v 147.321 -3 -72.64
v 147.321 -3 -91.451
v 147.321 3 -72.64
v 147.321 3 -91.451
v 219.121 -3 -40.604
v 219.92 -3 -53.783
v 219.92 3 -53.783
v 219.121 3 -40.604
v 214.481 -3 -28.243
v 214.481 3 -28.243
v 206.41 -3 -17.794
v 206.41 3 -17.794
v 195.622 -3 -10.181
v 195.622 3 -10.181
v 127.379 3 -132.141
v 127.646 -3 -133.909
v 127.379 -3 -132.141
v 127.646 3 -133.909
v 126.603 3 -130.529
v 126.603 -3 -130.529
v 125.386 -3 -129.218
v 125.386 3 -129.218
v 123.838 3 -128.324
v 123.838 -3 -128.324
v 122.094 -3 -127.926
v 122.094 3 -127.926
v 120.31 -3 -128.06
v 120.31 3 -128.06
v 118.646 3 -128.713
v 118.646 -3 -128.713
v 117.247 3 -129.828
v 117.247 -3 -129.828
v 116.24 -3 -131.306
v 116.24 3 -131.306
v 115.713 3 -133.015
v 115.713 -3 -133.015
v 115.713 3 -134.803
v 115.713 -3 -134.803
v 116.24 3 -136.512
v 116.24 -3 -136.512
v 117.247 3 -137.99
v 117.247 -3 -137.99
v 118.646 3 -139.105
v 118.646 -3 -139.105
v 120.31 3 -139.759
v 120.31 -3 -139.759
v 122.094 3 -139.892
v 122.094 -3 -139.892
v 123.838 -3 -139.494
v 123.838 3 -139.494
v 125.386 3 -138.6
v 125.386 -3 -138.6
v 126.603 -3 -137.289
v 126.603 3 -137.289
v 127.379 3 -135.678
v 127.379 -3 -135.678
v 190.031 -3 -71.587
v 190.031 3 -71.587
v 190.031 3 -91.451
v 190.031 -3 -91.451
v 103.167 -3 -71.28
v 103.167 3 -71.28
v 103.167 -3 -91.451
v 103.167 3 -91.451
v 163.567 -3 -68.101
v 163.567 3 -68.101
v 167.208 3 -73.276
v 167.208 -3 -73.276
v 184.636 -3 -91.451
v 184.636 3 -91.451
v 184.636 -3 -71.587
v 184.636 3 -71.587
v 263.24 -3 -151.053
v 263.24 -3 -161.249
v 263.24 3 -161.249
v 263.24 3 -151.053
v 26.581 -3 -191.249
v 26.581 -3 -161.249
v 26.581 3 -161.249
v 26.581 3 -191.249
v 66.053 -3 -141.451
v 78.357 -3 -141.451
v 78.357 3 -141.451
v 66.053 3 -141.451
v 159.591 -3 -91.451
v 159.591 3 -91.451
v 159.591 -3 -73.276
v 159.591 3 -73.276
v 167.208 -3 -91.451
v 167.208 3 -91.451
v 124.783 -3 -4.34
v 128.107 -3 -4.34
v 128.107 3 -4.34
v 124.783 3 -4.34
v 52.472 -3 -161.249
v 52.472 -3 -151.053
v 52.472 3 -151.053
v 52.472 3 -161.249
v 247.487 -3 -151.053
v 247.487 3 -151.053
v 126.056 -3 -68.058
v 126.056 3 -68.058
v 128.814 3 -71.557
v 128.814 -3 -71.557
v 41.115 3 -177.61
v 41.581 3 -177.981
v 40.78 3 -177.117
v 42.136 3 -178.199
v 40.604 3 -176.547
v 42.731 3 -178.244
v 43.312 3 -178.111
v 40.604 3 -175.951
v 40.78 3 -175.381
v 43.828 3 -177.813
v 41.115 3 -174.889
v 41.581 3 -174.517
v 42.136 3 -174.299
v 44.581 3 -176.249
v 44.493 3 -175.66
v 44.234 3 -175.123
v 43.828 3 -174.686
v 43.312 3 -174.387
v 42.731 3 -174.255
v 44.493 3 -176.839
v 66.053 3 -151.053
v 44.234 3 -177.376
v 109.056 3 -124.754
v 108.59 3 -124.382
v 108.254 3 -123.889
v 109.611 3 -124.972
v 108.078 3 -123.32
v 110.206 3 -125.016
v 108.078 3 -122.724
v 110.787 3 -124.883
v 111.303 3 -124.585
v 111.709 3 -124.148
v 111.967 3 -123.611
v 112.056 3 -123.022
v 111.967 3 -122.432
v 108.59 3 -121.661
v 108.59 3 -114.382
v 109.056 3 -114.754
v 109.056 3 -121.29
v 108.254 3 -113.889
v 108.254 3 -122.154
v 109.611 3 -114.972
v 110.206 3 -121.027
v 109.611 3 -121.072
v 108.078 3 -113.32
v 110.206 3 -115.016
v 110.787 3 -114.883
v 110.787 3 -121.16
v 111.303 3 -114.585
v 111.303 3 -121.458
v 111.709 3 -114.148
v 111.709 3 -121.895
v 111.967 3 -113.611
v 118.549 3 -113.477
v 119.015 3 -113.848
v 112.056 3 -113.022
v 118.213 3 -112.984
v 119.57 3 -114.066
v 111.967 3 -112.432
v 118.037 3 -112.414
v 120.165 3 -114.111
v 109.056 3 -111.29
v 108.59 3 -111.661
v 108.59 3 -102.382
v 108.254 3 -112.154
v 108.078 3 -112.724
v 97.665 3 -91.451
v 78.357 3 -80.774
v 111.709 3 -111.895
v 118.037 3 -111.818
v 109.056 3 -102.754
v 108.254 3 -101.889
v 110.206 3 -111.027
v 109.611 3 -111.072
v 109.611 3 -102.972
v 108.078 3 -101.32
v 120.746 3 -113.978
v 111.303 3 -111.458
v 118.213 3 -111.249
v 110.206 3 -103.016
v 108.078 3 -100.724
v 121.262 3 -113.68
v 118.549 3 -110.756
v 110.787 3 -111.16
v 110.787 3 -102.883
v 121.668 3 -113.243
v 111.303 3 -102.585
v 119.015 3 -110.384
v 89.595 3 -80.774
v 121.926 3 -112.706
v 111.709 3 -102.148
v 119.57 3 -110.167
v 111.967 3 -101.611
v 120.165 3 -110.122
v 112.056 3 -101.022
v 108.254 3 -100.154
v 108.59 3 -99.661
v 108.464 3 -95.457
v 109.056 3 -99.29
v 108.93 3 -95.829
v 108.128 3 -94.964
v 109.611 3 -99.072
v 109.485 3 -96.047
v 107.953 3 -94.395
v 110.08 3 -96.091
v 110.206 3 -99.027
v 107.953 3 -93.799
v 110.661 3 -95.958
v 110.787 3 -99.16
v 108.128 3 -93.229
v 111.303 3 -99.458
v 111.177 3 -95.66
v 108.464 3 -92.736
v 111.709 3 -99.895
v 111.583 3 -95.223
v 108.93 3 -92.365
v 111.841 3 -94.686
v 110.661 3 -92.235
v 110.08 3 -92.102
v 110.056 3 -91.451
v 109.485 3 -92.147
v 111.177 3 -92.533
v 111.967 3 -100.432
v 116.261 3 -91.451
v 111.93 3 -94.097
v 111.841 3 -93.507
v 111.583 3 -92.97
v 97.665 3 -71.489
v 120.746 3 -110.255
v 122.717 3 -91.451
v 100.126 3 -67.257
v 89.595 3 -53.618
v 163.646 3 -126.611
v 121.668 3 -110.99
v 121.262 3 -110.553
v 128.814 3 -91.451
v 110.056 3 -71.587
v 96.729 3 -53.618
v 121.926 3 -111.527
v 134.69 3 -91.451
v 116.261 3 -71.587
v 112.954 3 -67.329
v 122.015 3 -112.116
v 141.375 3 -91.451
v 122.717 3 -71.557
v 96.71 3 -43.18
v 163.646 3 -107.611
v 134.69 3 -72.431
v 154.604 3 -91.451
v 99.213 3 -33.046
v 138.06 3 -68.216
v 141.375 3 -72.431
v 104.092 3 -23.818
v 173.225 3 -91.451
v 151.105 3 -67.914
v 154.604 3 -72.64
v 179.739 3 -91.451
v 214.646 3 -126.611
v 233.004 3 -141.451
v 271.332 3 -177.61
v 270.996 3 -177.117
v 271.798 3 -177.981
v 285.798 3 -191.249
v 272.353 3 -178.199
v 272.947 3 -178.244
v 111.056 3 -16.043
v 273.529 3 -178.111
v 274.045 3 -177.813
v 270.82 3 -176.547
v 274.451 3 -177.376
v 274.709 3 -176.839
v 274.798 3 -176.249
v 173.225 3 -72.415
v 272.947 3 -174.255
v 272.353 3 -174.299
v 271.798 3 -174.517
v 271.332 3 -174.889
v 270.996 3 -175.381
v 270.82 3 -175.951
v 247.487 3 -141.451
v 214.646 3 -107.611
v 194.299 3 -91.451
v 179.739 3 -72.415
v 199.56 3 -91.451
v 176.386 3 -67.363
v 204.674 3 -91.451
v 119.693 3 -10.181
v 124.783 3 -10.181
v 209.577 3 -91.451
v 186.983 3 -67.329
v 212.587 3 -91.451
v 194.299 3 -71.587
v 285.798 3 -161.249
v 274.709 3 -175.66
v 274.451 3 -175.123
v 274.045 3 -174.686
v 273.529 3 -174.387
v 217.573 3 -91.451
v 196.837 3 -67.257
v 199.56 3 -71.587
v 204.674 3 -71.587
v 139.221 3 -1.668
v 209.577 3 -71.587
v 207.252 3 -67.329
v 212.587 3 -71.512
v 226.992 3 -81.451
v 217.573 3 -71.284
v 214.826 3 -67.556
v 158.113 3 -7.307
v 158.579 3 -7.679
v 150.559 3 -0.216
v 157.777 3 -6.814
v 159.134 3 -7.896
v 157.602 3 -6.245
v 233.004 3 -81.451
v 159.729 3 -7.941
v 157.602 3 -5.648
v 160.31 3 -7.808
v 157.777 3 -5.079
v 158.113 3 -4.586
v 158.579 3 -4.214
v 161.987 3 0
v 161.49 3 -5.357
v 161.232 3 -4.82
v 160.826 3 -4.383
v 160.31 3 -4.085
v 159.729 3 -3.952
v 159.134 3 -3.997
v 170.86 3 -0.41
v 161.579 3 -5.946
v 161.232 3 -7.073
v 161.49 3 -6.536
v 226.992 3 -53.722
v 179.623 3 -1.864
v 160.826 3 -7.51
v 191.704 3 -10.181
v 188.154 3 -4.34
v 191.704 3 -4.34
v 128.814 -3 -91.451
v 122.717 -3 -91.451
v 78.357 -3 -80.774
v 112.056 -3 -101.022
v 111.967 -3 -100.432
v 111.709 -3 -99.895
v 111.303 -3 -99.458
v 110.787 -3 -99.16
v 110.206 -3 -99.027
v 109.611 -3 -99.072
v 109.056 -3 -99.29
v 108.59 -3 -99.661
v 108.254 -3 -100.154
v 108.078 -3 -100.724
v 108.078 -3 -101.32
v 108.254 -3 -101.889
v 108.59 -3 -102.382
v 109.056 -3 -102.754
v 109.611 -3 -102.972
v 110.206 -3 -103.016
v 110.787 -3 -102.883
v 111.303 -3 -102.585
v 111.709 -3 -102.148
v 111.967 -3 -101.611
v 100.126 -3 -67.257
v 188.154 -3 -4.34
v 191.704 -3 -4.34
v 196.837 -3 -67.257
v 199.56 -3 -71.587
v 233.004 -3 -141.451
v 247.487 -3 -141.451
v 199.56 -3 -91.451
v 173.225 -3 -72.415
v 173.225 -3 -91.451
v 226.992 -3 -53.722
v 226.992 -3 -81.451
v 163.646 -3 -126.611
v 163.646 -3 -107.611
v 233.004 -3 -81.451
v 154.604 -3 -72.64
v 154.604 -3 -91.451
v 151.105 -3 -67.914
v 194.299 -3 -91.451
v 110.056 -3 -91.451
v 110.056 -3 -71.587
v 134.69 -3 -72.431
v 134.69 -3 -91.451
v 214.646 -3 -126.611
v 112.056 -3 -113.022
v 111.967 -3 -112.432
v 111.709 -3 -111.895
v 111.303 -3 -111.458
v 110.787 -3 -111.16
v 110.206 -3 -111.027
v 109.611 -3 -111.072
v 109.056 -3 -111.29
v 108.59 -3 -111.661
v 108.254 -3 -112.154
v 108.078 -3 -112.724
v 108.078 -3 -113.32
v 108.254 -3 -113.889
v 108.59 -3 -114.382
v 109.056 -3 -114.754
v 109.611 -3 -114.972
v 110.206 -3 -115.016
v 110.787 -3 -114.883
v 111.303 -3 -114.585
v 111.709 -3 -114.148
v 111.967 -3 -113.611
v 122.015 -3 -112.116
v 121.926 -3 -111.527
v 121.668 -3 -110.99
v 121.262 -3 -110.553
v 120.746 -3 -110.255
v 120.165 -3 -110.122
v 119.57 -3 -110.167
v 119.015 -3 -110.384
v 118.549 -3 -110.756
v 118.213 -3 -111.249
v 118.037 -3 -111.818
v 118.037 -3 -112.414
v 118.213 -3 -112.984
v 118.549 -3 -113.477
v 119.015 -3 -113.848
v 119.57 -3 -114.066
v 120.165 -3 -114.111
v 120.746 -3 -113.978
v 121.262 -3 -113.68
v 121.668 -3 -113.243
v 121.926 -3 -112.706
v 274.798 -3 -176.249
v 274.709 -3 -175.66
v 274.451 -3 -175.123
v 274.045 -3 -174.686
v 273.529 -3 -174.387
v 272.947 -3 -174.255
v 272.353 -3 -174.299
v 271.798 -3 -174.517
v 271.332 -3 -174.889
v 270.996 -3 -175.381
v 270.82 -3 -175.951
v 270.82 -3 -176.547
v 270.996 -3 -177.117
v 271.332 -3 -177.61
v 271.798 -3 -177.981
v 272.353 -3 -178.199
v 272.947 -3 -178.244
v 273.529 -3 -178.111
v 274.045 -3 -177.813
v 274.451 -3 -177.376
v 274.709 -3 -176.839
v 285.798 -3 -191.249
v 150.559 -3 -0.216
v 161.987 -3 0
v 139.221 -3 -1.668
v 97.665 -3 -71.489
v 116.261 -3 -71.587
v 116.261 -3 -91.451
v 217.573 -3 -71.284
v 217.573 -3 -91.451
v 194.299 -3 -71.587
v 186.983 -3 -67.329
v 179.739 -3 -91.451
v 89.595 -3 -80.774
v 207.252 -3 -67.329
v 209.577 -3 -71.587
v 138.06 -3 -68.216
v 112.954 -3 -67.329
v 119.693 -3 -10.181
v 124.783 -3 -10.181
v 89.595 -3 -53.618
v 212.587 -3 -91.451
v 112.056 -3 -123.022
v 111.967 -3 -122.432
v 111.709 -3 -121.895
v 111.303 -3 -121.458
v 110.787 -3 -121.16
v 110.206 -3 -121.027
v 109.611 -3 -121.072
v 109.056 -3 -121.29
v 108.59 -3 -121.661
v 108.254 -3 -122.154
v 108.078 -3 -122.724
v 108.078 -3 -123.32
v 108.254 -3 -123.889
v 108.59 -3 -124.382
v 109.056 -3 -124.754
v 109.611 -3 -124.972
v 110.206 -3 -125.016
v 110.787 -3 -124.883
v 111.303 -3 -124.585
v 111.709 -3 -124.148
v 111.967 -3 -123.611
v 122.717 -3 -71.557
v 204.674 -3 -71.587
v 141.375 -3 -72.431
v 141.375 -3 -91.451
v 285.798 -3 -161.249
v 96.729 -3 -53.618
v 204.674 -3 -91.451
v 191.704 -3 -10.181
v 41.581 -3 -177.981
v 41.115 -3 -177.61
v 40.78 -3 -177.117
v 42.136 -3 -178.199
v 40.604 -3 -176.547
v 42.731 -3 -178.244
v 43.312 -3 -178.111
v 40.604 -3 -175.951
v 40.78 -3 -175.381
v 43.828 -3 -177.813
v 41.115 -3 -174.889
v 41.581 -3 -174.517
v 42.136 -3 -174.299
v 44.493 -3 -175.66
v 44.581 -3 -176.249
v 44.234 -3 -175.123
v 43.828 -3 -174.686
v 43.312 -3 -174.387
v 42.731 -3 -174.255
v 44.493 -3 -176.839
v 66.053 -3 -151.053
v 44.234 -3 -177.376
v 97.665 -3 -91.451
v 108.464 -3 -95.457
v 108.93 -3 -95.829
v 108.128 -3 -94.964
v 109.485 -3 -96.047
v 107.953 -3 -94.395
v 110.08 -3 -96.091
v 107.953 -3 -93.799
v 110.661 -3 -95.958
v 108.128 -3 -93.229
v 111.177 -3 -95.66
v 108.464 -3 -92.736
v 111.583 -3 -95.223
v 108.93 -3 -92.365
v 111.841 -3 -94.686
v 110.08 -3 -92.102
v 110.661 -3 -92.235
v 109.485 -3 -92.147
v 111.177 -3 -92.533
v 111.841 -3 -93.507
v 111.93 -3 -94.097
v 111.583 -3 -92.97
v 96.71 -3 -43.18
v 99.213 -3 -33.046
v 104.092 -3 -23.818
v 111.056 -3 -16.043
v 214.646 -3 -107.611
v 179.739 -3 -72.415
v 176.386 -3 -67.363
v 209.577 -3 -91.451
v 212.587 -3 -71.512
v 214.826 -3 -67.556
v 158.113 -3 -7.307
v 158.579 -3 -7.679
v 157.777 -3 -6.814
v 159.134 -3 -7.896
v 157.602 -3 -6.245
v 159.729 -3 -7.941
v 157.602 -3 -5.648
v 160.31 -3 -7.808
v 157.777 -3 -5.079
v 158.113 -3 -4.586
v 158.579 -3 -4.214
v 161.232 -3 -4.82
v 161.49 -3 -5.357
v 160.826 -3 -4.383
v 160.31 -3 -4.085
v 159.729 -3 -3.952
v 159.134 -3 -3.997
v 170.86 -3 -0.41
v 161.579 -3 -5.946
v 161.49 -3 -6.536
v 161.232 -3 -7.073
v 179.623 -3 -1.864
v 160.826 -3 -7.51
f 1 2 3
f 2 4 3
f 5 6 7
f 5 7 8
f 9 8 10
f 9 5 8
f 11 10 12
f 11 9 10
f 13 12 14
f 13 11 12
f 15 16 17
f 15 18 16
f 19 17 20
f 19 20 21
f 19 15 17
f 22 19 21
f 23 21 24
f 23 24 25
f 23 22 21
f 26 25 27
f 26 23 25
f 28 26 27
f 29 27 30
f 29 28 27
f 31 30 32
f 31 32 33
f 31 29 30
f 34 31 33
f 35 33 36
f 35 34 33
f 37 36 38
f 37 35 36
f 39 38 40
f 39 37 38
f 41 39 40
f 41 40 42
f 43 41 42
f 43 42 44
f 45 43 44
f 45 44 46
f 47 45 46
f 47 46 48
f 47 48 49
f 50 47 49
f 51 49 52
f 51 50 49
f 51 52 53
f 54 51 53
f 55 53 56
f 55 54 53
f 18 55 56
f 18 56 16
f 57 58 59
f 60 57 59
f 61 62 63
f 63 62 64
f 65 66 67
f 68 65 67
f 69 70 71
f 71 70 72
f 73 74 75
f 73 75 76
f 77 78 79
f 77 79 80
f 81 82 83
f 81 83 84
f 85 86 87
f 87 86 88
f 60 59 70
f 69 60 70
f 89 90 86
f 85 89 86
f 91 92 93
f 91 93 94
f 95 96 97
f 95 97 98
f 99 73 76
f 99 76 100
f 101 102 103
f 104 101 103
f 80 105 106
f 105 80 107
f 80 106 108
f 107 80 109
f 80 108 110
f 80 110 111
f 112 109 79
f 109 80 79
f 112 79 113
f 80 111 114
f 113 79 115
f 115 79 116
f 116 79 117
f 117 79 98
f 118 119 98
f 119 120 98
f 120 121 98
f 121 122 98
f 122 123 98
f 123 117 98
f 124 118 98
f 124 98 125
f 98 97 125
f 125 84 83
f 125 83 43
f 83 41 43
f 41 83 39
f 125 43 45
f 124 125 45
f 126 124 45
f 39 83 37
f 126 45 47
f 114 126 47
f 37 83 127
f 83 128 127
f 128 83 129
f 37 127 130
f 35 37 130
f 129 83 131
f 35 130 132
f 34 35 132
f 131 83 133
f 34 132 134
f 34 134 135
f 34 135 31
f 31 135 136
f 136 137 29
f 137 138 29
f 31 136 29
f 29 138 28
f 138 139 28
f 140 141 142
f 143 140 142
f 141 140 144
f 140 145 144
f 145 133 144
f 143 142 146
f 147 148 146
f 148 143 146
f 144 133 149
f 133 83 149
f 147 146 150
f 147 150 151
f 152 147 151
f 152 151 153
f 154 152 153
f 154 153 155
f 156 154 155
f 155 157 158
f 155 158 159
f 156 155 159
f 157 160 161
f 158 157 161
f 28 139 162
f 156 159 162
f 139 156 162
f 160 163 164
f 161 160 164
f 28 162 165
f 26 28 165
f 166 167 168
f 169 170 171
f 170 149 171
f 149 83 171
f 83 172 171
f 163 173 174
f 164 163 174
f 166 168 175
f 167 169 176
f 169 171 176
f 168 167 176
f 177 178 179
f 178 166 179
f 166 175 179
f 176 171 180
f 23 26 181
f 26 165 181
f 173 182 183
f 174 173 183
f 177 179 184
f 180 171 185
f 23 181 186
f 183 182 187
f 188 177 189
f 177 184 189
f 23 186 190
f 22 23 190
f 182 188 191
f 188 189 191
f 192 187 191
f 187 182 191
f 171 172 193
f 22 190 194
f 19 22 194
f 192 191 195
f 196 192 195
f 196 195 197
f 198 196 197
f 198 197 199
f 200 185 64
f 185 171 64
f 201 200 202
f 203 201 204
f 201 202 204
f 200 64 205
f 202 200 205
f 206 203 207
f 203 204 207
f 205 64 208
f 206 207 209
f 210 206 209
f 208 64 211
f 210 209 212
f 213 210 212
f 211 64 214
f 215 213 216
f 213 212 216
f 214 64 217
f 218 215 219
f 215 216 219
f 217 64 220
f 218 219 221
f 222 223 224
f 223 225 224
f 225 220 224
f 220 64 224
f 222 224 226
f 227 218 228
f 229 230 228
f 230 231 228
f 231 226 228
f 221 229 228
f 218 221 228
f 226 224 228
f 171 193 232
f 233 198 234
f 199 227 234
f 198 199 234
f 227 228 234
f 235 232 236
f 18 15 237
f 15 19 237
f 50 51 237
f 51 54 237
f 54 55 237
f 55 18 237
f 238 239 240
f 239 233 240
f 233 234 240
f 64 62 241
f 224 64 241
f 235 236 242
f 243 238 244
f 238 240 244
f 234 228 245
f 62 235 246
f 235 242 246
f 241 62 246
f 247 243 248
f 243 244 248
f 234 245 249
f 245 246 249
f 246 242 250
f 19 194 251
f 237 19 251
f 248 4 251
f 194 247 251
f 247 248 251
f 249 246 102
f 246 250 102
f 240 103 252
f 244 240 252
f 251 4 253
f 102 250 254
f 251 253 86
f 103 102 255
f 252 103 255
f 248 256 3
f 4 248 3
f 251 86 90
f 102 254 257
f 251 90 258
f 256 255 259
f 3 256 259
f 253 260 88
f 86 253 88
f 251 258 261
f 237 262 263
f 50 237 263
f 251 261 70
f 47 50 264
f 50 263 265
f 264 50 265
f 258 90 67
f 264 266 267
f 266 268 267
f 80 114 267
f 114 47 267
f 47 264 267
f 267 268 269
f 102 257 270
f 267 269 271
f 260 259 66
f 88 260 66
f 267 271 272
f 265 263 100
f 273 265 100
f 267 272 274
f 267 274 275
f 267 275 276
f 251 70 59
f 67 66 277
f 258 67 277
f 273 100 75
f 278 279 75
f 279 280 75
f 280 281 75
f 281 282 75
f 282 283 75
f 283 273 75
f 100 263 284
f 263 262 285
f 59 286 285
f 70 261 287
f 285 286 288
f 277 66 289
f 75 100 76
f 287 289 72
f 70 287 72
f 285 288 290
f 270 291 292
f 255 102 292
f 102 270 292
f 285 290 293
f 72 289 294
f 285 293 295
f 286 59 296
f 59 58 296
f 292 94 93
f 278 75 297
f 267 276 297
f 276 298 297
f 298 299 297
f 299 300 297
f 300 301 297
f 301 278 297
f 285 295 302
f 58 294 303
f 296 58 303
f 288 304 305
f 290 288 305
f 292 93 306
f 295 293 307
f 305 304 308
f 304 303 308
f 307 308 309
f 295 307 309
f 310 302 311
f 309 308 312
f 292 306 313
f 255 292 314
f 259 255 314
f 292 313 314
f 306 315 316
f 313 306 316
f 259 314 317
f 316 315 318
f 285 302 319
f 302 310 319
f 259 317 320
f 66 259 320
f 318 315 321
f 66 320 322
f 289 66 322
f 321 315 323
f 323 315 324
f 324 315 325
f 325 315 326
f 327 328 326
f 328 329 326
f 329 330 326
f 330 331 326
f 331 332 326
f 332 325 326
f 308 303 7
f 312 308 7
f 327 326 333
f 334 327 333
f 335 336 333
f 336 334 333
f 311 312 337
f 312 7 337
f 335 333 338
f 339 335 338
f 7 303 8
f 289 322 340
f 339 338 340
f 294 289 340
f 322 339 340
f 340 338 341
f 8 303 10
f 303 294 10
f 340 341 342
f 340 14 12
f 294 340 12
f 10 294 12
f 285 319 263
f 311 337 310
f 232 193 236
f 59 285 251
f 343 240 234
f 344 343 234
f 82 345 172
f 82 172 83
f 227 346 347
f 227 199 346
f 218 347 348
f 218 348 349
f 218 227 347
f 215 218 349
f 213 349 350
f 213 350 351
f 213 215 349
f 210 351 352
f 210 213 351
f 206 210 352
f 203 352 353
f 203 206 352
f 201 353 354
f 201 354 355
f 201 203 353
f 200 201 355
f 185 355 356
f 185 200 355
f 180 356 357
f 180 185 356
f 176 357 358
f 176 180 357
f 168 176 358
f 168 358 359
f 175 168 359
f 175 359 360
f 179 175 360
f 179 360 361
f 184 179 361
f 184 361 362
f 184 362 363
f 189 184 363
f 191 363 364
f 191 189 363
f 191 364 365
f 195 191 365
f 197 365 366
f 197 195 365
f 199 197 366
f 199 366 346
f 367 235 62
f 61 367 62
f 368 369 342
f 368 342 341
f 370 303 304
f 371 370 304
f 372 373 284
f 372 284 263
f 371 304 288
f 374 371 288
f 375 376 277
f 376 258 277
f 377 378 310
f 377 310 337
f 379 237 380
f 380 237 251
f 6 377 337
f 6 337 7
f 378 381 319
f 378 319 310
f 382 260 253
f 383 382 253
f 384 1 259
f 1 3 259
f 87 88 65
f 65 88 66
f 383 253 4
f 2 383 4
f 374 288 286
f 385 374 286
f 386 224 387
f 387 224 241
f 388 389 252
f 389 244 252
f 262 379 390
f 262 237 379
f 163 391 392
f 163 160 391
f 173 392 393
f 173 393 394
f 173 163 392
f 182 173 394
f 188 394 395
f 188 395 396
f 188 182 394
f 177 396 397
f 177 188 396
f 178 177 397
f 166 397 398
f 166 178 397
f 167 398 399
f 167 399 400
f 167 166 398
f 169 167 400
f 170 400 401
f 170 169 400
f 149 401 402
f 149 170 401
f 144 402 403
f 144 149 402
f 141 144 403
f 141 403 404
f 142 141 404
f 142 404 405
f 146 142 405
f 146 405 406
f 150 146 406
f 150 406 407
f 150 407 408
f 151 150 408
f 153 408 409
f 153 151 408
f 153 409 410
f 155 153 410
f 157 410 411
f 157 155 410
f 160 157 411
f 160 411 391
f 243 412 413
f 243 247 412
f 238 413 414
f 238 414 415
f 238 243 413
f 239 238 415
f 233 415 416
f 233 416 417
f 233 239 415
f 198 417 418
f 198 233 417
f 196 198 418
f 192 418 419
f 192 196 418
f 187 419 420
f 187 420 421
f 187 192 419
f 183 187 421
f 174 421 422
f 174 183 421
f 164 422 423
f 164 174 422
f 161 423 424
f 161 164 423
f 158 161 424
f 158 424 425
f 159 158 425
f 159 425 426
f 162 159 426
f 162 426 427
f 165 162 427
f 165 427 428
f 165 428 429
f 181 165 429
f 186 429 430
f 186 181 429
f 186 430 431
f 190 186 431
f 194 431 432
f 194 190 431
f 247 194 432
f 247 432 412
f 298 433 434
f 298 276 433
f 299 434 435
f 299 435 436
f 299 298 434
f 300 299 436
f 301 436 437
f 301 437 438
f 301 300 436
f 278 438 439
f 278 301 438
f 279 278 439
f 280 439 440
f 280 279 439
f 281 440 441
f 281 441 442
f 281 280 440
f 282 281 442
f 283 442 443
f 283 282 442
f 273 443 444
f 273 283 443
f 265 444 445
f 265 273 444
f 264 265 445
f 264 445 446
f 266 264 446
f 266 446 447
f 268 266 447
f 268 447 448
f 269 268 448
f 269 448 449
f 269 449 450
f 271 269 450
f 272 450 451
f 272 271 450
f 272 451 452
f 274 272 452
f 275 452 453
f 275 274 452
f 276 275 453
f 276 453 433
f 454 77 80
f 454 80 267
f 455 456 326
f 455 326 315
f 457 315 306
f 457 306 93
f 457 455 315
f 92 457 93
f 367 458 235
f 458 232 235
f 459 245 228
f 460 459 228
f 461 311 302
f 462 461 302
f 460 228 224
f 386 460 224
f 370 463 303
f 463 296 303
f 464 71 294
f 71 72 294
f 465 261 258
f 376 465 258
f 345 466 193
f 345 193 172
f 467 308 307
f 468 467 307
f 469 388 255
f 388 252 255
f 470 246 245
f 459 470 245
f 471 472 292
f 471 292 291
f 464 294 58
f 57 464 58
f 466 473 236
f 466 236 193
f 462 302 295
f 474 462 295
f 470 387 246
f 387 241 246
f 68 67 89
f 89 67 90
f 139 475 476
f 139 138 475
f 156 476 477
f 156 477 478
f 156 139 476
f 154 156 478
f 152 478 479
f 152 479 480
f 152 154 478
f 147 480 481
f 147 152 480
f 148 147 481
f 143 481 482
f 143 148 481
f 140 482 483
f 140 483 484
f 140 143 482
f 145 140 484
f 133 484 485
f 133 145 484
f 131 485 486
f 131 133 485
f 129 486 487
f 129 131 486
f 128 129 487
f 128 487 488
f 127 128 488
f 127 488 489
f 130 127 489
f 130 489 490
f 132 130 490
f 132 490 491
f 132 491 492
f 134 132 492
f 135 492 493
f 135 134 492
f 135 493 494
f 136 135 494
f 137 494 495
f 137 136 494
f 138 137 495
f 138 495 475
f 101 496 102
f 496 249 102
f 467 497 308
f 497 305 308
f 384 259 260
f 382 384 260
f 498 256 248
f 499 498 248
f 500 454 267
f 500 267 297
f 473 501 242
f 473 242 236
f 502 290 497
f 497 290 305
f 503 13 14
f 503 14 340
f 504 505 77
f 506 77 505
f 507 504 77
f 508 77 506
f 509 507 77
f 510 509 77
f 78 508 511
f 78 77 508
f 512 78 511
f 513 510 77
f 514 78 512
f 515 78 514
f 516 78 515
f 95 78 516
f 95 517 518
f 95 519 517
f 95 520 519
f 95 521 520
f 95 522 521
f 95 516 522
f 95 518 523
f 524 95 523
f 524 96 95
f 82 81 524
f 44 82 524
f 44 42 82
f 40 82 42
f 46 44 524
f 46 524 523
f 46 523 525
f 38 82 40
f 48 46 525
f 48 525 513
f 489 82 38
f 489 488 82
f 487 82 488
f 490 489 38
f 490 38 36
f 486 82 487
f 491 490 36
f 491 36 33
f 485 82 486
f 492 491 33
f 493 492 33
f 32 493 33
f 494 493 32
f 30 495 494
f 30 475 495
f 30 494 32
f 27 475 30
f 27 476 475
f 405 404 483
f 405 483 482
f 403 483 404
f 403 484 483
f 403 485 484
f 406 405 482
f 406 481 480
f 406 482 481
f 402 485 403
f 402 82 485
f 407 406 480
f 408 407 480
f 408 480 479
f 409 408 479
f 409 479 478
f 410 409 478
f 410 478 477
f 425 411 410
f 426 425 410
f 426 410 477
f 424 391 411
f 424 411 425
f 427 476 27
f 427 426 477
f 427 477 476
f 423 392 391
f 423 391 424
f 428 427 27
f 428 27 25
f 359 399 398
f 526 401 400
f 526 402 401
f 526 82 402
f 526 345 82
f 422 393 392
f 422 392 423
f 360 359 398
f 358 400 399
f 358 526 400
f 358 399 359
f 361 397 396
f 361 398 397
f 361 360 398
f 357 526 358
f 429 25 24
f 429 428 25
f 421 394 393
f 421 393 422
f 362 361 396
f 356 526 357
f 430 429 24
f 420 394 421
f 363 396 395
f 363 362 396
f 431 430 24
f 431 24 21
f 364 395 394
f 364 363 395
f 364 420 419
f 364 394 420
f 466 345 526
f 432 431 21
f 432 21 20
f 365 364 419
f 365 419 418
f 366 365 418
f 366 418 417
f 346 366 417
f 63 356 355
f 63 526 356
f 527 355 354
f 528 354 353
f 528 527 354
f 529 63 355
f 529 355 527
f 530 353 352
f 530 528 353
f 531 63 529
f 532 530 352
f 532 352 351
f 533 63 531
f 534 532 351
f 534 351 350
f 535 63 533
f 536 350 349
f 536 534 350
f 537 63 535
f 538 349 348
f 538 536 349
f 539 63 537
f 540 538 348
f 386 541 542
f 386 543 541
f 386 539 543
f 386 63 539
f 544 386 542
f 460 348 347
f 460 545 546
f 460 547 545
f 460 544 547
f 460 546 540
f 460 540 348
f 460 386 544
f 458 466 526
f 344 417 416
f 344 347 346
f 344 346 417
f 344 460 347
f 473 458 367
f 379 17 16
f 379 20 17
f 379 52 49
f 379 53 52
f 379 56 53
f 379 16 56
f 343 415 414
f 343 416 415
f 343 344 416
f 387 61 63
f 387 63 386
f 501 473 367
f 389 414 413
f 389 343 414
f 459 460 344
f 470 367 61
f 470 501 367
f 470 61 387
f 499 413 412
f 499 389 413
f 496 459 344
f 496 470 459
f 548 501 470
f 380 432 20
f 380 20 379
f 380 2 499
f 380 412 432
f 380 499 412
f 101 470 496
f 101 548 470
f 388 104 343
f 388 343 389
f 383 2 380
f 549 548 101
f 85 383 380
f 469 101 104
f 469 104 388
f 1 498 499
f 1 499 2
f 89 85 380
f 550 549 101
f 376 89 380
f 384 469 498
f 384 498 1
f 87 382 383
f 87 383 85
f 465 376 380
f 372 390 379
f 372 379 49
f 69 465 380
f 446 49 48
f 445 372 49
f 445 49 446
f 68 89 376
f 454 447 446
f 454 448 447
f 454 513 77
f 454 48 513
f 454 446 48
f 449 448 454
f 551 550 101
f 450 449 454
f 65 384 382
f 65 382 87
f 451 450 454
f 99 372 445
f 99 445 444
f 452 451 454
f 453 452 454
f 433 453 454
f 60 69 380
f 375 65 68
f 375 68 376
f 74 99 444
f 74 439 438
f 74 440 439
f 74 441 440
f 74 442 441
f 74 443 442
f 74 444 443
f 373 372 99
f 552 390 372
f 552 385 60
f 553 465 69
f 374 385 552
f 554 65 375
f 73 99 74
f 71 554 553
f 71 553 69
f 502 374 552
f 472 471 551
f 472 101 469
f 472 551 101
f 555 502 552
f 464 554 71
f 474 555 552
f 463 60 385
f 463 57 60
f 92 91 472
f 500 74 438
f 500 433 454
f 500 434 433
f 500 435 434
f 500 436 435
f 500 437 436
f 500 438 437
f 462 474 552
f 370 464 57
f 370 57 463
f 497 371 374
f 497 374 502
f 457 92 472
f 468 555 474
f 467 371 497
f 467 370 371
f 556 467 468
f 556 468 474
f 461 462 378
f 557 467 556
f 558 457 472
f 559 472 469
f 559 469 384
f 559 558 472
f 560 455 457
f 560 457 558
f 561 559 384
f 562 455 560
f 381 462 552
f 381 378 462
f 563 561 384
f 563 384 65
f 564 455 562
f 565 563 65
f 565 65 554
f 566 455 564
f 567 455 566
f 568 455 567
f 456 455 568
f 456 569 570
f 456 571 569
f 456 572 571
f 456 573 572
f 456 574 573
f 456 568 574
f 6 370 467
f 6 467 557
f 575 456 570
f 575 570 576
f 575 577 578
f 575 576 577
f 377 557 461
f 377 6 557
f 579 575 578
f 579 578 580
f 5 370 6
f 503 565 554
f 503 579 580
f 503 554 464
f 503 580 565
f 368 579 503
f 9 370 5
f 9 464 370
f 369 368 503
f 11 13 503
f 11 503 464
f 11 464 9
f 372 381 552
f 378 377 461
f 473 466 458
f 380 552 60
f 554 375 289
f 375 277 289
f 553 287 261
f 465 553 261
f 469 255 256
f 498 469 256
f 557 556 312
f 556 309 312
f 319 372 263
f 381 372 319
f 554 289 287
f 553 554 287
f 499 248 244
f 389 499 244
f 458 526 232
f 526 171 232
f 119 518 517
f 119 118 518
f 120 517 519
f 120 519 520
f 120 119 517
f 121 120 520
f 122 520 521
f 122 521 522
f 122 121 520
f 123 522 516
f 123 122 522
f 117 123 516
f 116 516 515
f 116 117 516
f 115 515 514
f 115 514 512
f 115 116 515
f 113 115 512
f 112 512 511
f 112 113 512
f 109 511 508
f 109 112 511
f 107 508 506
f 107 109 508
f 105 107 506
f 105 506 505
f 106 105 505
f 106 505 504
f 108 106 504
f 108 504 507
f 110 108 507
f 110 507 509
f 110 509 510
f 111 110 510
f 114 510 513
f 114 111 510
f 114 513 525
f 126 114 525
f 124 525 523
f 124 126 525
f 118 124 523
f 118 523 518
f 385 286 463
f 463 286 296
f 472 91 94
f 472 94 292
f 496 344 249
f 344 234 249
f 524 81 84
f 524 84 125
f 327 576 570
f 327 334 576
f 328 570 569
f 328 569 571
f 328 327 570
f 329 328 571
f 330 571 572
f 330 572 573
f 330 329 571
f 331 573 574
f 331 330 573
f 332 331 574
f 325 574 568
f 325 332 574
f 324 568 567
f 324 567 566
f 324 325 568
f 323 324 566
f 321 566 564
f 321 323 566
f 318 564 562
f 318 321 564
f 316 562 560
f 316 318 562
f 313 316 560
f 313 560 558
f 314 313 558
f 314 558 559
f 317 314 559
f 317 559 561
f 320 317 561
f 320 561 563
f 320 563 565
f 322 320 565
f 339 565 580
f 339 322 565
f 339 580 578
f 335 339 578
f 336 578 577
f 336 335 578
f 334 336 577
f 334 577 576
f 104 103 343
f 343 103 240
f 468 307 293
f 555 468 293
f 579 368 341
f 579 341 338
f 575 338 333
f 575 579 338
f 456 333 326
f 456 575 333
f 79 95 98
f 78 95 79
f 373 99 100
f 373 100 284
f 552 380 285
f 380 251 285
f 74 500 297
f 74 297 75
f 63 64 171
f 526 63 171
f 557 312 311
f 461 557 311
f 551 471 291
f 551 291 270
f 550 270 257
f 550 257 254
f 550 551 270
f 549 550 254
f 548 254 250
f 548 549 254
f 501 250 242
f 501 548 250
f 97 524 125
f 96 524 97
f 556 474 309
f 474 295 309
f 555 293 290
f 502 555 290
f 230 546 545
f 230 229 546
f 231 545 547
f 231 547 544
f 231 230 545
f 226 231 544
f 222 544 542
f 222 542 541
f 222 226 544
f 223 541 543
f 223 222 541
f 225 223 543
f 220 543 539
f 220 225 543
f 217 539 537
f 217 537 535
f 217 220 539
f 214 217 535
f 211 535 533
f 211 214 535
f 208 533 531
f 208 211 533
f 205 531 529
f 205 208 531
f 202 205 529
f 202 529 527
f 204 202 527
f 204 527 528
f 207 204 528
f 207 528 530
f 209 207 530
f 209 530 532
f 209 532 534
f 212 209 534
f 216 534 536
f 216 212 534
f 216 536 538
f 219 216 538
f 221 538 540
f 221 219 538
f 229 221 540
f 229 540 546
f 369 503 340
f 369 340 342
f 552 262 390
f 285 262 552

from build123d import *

# Parameters (mm, degrees)
F0_R          = 2
F0_R_2        = 6
F0_W          = 51
F0_H          = 19
F1_DEPTH      = 3
F1_DEPTH_BACK = 3
F2_DEPTH      = 3


with BuildPart() as f1:
    # F0 (on Front) → F1 (new body, two sides)
    with BuildSketch(Plane.XZ) as f1_sk:
        Polygon((52.472187, -161.24922), (26.581464, -161.24922), (26.581464, -191.24922), (285.798032, -191.24922), (285.798032, -161.24922), (263.240432, -161.24922), align=None)
        with Locations((42.581464, -176.24922)):
            Circle(F0_R, mode=Mode.SUBTRACT)
        with Locations((272.798032, -176.24922)):
            Circle(F0_R, mode=Mode.SUBTRACT)
        Polygon((52.472187, -151.052892), (52.472187, -161.24922), (263.240432, -161.24922), (263.240432, -151.052892), (247.487148, -151.052892), (66.052614, -151.052892), align=None)
        Polygon((66.052614, -141.450859), (66.052614, -151.052892), (247.487148, -151.052892), (247.487148, -141.450859), (233.003996, -141.450859), (78.357242, -141.450859), align=None)
        Polygon((78.357242, -80.774188), (78.357242, -141.450859), (233.003996, -141.450859), (233.003996, -81.450859), (226.991639, -81.450859), (221.457498, -91.450859), (217.57254, -91.450859), (212.587059, -91.450859), (209.57654, -91.450859), (204.673612, -91.450859), (199.559822, -91.450859), (194.298849, -91.450859), (190.03109, -91.450859), (184.636118, -91.450859), (179.739267, -91.450859), (173.225334, -91.450859), (167.207984, -91.450859), (159.590964, -91.450859), (154.603716, -91.450859), (147.321078, -91.450859), (141.375312, -91.450859), (134.690078, -91.450859), (128.813708, -91.450859), (122.717327, -91.450859), (116.260559, -91.450859), (110.056117, -91.450859), (103.166793, -91.450859), (97.665451, -91.450859), (89.594654, -80.774188), align=None)
        with Locations((121.645503, -133.909166)):
            Circle(F0_R_2, mode=Mode.SUBTRACT)
        with Locations((110.056117, -123.021676)):
            Circle(F0_R, mode=Mode.SUBTRACT)
        with Locations((110.056117, -113.021676)):
            Circle(F0_R, mode=Mode.SUBTRACT)
        with Locations((120.015055, -112.116382)):
            Circle(F0_R, mode=Mode.SUBTRACT)
        with Locations((110.056117, -101.021676)):
            Circle(F0_R, mode=Mode.SUBTRACT)
        with Locations((189.145503, -117.110979)):
            Rectangle(F0_W, F0_H, mode=Mode.SUBTRACT)
        with Locations((109.930342, -94.096712)):
            Circle(F0_R, mode=Mode.SUBTRACT)
        Polygon((89.594654, -53.617763), (89.594654, -80.774188), (97.665451, -91.450859), (97.665451, -71.488872), (100.125542, -67.256524), (103.166793, -71.279724), (103.166793, -91.450859), (110.056117, -91.450859), (110.056117, -71.586892), (112.953584, -67.329317), (116.260559, -71.586892), (116.260559, -91.450859), (122.717327, -91.450859), (122.717327, -71.556566), (126.055585, -68.058384), (128.813708, -71.556566), (128.813708, -91.450859), (134.690078, -91.450859), (134.690078, -72.430915), (138.060334, -68.216196), (141.375312, -72.430915), (141.375312, -91.450859), (147.321078, -91.450859), (147.321078, -72.639709), (151.104841, -67.914439), (154.603716, -72.639709), (154.603716, -91.450859), (159.590964, -91.450859), (159.590964, -73.276494), (163.56732, -68.100847), (167.207984, -73.276494), (167.207984, -91.450859), (173.225334, -91.450859), (173.225334, -72.414774), (176.386258, -67.362841), (179.739267, -72.414774), (179.739267, -91.450859), (184.636118, -91.450859), (184.636118, -71.586892), (186.982751, -67.329317), (190.03109, -71.586892), (190.03109, -91.450859), (194.298849, -91.450859), (194.298849, -71.586892), (196.836814, -67.257442), (199.559822, -71.586892), (199.559822, -91.450859), (204.673612, -91.450859), (204.673612, -71.586892), (207.251813, -67.329317), (209.57654, -71.586892), (209.57654, -91.450859), (212.587059, -91.450859), (212.587059, -71.512245), (214.826435, -67.556024), (217.57254, -71.284115), (217.57254, -91.450859), (221.457498, -91.450859), (226.991639, -81.450859), (226.991639, -53.721661), (219.91986, -53.783055), (198.035091, -53.973049), (96.72894, -53.617763), align=None)
        with BuildLine():
            ThreePointArc((119.692937, -10.181499), (101.370795, -28.283366), (96.72894, -53.617763))
            Line((96.72894, -53.617763), (198.035091, -53.973049))
            Line((198.035091, -53.973049), (219.91986, -53.783055))
            ThreePointArc((219.91986, -53.783055), (214.480878, -28.243005), (195.621964, -10.181499))
            Line((195.621964, -10.181499), (191.704065, -10.181499))
            Line((191.704065, -10.181499), (191.704065, -4.340463))
            Line((191.704065, -4.340463), (188.154012, -4.340463))
            ThreePointArc((188.154012, -4.340463), (175.263432, -1.007217), (161.987022, 0))
            ThreePointArc((161.987022, 0), (144.870074, -0.788162), (128.10725, -4.340463))
            Line((128.10725, -4.340463), (124.78289, -4.340463))
            Line((124.78289, -4.340463), (124.78289, -10.181499))
            Line((124.78289, -10.181499), (119.692937, -10.181499))
        make_face()
        with Locations((159.579262, -5.946493)):
            Circle(F0_R, mode=Mode.SUBTRACT)
    extrude(amount=F1_DEPTH)
    extrude(f1_sk.sketch, amount=-F1_DEPTH_BACK)

    # F0 (on Front) → F2 (join)
    with BuildSketch(Plane.XZ):
        Polygon((52.472187, -161.24922), (26.581464, -161.24922), (26.581464, -191.24922), (285.798032, -191.24922), (285.798032, -161.24922), (263.240432, -161.24922), align=None)
        with Locations((42.581464, -176.24922)):
            Circle(F0_R, mode=Mode.SUBTRACT)
        with Locations((272.798032, -176.24922)):
            Circle(F0_R, mode=Mode.SUBTRACT)
        Polygon((52.472187, -151.052892), (52.472187, -161.24922), (263.240432, -161.24922), (263.240432, -151.052892), (247.487148, -151.052892), (66.052614, -151.052892), align=None)
        Polygon((66.052614, -141.450859), (66.052614, -151.052892), (247.487148, -151.052892), (247.487148, -141.450859), (233.003996, -141.450859), (78.357242, -141.450859), align=None)
        Polygon((78.357242, -80.774188), (78.357242, -141.450859), (233.003996, -141.450859), (233.003996, -81.450859), (226.991639, -81.450859), (221.457498, -91.450859), (217.57254, -91.450859), (212.587059, -91.450859), (209.57654, -91.450859), (204.673612, -91.450859), (199.559822, -91.450859), (194.298849, -91.450859), (190.03109, -91.450859), (184.636118, -91.450859), (179.739267, -91.450859), (173.225334, -91.450859), (167.207984, -91.450859), (159.590964, -91.450859), (154.603716, -91.450859), (147.321078, -91.450859), (141.375312, -91.450859), (134.690078, -91.450859), (128.813708, -91.450859), (122.717327, -91.450859), (116.260559, -91.450859), (110.056117, -91.450859), (103.166793, -91.450859), (97.665451, -91.450859), (89.594654, -80.774188), align=None)
        with Locations((121.645503, -133.909166)):
            Circle(F0_R_2, mode=Mode.SUBTRACT)
        with Locations((110.056117, -123.021676)):
            Circle(F0_R, mode=Mode.SUBTRACT)
        with Locations((110.056117, -113.021676)):
            Circle(F0_R, mode=Mode.SUBTRACT)
        with Locations((120.015055, -112.116382)):
            Circle(F0_R, mode=Mode.SUBTRACT)
        with Locations((110.056117, -101.021676)):
            Circle(F0_R, mode=Mode.SUBTRACT)
        with Locations((189.145503, -117.110979)):
            Rectangle(F0_W, F0_H, mode=Mode.SUBTRACT)
        with Locations((109.930342, -94.096712)):
            Circle(F0_R, mode=Mode.SUBTRACT)
        Polygon((89.594654, -53.617763), (89.594654, -80.774188), (97.665451, -91.450859), (97.665451, -71.488872), (100.125542, -67.256524), (103.166793, -71.279724), (103.166793, -91.450859), (110.056117, -91.450859), (110.056117, -71.586892), (112.953584, -67.329317), (116.260559, -71.586892), (116.260559, -91.450859), (122.717327, -91.450859), (122.717327, -71.556566), (126.055585, -68.058384), (128.813708, -71.556566), (128.813708, -91.450859), (134.690078, -91.450859), (134.690078, -72.430915), (138.060334, -68.216196), (141.375312, -72.430915), (141.375312, -91.450859), (147.321078, -91.450859), (147.321078, -72.639709), (151.104841, -67.914439), (154.603716, -72.639709), (154.603716, -91.450859), (159.590964, -91.450859), (159.590964, -73.276494), (163.56732, -68.100847), (167.207984, -73.276494), (167.207984, -91.450859), (173.225334, -91.450859), (173.225334, -72.414774), (176.386258, -67.362841), (179.739267, -72.414774), (179.739267, -91.450859), (184.636118, -91.450859), (184.636118, -71.586892), (186.982751, -67.329317), (190.03109, -71.586892), (190.03109, -91.450859), (194.298849, -91.450859), (194.298849, -71.586892), (196.836814, -67.257442), (199.559822, -71.586892), (199.559822, -91.450859), (204.673612, -91.450859), (204.673612, -71.586892), (207.251813, -67.329317), (209.57654, -71.586892), (209.57654, -91.450859), (212.587059, -91.450859), (212.587059, -71.512245), (214.826435, -67.556024), (217.57254, -71.284115), (217.57254, -91.450859), (221.457498, -91.450859), (226.991639, -81.450859), (226.991639, -53.721661), (219.91986, -53.783055), (198.035091, -53.973049), (96.72894, -53.617763), align=None)
        with BuildLine():
            ThreePointArc((119.692937, -10.181499), (101.370795, -28.283366), (96.72894, -53.617763))
            Line((96.72894, -53.617763), (198.035091, -53.973049))
            Line((198.035091, -53.973049), (219.91986, -53.783055))
            ThreePointArc((219.91986, -53.783055), (214.480878, -28.243005), (195.621964, -10.181499))
            Line((195.621964, -10.181499), (191.704065, -10.181499))
            Line((191.704065, -10.181499), (191.704065, -4.340463))
            Line((191.704065, -4.340463), (188.154012, -4.340463))
            ThreePointArc((188.154012, -4.340463), (175.263432, -1.007217), (161.987022, 0))
            ThreePointArc((161.987022, 0), (144.870074, -0.788162), (128.10725, -4.340463))
            Line((128.10725, -4.340463), (124.78289, -4.340463))
            Line((124.78289, -4.340463), (124.78289, -10.181499))
            Line((124.78289, -10.181499), (119.692937, -10.181499))
        make_face()
        with Locations((159.579262, -5.946493)):
            Circle(F0_R, mode=Mode.SUBTRACT)
    extrude(amount=F2_DEPTH)


solid = f1.part
